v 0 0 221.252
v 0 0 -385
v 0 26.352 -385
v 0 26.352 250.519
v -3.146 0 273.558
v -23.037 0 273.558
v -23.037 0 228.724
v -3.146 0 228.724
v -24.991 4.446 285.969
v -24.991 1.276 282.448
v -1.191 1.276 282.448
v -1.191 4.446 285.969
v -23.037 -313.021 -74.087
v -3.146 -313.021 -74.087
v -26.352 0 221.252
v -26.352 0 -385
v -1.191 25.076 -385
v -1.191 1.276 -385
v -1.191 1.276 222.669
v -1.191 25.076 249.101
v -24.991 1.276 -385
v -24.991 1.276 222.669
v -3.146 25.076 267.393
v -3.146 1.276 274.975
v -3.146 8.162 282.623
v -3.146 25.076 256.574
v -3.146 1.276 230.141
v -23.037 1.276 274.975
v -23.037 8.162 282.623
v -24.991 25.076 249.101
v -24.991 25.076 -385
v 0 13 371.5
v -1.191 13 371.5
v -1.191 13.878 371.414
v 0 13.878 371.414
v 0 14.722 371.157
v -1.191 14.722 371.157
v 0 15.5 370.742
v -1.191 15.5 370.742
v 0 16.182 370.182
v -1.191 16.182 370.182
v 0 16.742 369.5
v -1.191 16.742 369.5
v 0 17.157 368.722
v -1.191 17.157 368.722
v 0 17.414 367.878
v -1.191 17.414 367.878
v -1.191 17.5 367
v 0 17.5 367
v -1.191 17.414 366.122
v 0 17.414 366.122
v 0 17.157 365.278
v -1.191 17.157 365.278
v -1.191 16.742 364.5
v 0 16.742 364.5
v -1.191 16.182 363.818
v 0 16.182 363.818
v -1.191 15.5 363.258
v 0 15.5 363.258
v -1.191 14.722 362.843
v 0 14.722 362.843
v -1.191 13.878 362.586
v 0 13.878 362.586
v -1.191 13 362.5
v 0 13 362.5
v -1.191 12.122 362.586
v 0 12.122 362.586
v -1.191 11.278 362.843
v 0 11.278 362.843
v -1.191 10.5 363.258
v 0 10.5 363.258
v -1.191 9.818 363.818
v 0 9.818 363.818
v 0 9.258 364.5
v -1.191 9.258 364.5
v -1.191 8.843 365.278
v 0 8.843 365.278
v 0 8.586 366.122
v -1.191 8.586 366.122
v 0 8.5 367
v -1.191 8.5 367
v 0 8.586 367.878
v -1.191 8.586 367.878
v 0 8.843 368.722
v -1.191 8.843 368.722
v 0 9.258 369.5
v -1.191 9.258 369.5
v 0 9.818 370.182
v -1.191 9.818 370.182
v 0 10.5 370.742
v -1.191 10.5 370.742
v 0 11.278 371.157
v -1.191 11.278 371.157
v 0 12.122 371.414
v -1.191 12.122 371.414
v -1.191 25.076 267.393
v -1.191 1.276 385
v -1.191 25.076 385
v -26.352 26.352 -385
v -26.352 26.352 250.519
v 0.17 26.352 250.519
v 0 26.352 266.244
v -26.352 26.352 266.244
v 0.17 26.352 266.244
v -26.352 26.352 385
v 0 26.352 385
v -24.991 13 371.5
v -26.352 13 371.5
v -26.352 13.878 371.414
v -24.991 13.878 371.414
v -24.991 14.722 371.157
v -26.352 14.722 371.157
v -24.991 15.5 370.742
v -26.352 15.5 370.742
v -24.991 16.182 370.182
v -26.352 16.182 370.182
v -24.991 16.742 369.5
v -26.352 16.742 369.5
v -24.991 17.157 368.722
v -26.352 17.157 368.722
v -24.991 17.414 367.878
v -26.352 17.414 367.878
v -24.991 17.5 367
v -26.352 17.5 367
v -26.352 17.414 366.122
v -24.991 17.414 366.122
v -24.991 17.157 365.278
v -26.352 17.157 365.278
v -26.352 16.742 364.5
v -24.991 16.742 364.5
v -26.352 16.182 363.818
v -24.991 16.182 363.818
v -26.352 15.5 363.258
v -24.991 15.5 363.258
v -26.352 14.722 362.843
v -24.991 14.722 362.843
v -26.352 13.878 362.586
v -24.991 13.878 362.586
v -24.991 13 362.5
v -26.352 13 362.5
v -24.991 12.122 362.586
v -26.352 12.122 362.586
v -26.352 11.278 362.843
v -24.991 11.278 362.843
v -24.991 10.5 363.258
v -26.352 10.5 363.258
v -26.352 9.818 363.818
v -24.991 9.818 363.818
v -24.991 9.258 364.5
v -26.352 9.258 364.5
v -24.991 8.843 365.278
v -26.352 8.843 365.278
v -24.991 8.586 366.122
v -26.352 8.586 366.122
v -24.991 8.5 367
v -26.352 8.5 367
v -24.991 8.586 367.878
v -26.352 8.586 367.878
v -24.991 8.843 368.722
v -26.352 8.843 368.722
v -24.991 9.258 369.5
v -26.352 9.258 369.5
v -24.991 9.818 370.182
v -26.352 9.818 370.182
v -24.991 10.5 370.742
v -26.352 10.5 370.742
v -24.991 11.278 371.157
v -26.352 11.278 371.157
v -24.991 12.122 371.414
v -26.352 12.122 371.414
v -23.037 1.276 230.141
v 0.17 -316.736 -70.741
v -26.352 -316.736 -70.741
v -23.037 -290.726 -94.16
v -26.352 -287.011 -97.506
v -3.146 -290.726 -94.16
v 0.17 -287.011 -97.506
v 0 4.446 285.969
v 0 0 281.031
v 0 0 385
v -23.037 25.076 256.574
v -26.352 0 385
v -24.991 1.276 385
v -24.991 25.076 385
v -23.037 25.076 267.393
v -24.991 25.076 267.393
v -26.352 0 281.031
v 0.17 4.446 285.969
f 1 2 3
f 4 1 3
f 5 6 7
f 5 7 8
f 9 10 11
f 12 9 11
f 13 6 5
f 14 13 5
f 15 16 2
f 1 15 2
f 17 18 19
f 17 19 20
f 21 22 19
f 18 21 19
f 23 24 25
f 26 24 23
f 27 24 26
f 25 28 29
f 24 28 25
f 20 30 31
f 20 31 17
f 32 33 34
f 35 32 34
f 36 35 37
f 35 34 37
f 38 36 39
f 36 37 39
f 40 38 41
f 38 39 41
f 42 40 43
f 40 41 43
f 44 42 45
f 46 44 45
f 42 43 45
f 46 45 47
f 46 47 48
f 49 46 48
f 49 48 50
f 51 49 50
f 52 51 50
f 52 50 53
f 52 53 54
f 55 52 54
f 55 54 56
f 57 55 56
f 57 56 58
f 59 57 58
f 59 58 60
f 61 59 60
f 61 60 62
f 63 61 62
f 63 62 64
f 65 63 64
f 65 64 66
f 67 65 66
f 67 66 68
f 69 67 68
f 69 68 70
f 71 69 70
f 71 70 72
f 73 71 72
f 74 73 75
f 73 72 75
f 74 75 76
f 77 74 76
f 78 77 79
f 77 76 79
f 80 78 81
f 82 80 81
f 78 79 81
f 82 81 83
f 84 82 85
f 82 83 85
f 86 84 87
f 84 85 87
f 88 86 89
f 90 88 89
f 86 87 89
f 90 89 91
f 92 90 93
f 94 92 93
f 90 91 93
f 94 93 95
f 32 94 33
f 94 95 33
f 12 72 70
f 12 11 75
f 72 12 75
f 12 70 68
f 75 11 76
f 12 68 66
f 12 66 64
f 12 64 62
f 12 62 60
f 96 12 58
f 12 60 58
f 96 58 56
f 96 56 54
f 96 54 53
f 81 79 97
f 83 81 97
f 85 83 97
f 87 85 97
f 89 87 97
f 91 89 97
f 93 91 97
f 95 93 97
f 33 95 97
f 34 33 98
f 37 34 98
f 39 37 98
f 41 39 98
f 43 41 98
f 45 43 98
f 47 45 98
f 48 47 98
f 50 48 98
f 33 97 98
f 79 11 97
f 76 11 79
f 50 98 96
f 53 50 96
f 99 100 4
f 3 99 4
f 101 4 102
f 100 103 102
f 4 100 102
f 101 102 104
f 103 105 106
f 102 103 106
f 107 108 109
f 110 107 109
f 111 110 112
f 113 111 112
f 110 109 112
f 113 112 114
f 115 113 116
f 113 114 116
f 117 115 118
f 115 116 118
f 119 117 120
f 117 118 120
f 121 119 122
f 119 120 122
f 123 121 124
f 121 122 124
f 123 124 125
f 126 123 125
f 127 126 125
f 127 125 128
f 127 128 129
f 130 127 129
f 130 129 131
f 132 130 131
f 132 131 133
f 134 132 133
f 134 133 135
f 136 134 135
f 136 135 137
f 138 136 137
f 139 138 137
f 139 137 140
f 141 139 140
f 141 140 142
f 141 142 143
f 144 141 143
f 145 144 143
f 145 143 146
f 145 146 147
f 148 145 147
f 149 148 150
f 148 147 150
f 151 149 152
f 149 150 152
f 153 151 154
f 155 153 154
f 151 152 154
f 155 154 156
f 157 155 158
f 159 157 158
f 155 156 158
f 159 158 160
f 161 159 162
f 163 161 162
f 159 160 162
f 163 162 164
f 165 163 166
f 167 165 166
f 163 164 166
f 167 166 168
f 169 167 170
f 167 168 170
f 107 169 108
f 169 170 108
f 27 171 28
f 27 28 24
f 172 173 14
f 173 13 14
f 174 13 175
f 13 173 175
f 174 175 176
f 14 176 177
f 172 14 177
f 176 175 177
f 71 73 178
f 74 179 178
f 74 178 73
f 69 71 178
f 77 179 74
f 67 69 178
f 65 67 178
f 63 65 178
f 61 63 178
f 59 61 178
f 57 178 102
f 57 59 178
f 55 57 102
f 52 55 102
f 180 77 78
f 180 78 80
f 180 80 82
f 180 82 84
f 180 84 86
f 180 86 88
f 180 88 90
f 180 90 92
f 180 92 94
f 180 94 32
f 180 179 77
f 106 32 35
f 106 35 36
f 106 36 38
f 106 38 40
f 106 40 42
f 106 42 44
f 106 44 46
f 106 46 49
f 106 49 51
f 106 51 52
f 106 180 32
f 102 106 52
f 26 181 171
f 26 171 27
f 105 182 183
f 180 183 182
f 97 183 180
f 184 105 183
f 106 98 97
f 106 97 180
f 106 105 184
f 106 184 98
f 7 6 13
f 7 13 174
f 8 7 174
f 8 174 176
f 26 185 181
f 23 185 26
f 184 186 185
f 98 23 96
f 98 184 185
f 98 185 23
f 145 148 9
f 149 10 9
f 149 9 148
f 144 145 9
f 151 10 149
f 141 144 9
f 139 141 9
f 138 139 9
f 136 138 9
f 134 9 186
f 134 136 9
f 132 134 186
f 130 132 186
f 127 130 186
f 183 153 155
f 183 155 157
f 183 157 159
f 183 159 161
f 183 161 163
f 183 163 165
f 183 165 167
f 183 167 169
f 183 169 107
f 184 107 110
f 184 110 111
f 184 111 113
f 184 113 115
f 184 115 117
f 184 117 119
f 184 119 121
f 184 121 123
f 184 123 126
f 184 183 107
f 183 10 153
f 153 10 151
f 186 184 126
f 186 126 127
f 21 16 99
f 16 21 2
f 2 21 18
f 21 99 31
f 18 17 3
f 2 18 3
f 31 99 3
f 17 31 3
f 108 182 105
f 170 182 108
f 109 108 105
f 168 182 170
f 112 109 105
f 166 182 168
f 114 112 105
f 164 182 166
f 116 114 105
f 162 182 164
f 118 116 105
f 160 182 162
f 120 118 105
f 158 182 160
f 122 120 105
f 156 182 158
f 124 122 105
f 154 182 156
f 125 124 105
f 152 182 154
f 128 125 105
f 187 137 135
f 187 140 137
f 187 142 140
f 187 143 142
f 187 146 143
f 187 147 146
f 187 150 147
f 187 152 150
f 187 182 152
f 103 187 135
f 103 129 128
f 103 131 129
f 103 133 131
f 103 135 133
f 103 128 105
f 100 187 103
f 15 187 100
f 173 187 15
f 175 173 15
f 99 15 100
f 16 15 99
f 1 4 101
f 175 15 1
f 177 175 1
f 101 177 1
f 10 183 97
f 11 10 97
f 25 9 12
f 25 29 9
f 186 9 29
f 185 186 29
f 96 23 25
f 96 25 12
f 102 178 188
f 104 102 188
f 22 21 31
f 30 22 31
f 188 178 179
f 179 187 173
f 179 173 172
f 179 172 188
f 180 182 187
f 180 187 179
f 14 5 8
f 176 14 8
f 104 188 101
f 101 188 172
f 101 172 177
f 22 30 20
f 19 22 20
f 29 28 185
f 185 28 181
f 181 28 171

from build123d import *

# Parameters (mm, degrees)
SKETCH2_W           = 26.352182783
SKETCH2_H           = 26.352182783
SKETCH2_W_2         = 23.8
SKETCH2_H_2         = 23.8
BOSS_EXTRUDE1_DEPTH = 385
SKETCH3_R           = 4.5
CUT_EXTRUDE1_DEPTH  = 387.799528276
SKETCH4_W           = 26.521697909
SKETCH4_H           = 40
SKETCH4_W_2         = 19.891273431
SKETCH4_H_2         = 30
BOSS_EXTRUDE2_DEPTH = 480
CUT_EXTRUDE2_DEPTH  = 500.249823585


with BuildPart() as part:
    # Sketch2 → Boss-Extrude1 (new, symmetric)
    with BuildSketch(Plane.XY):
        with Locations((-13.176091391, 13.176091391)):
            Rectangle(SKETCH2_W, SKETCH2_H)
        with Locations((-13.091333829, 13.176091663)):
            Rectangle(SKETCH2_W_2, SKETCH2_H_2, mode=Mode.SUBTRACT)
    extrude(amount=BOSS_EXTRUDE1_DEPTH, both=True)

    # Sketch3 → Cut-Extrude1 (cut, through all)
    with BuildSketch(Plane.ZY.offset(26.352182783)):
        with Locations((367, 13)):
            Circle(SKETCH3_R)
    extrude(amount=-CUT_EXTRUDE1_DEPTH, mode=Mode.SUBTRACT)

    # Sketch4 → Boss-Extrude2 (add)
    with BuildSketch(Plane(origin=(0, -176.990909821, -196.568319459), x_dir=(1, 0, 0), z_dir=(0, 0.6691306063588407, 0.7431448254774101))):
        with Locations((-13.091333828, -168.046187829)):
            Rectangle(SKETCH4_W, SKETCH4_H)
        with Locations((-13.091333829, -168.046187829)):
            Rectangle(SKETCH4_W_2, SKETCH4_H_2, mode=Mode.SUBTRACT)
    extrude(amount=BOSS_EXTRUDE2_DEPTH)

    # Sketch5 → Cut-Extrude2 (cut, through all)
    with BuildSketch(Plane.ZY.offset(26.352182783)):
        Polygon((266.244447792, 26.352182783), (250.51862, 26.352182783), (259.203432202, 34.172022814), align=None)
    extrude(amount=-CUT_EXTRUDE2_DEPTH, mode=Mode.SUBTRACT)


solid = part.part
